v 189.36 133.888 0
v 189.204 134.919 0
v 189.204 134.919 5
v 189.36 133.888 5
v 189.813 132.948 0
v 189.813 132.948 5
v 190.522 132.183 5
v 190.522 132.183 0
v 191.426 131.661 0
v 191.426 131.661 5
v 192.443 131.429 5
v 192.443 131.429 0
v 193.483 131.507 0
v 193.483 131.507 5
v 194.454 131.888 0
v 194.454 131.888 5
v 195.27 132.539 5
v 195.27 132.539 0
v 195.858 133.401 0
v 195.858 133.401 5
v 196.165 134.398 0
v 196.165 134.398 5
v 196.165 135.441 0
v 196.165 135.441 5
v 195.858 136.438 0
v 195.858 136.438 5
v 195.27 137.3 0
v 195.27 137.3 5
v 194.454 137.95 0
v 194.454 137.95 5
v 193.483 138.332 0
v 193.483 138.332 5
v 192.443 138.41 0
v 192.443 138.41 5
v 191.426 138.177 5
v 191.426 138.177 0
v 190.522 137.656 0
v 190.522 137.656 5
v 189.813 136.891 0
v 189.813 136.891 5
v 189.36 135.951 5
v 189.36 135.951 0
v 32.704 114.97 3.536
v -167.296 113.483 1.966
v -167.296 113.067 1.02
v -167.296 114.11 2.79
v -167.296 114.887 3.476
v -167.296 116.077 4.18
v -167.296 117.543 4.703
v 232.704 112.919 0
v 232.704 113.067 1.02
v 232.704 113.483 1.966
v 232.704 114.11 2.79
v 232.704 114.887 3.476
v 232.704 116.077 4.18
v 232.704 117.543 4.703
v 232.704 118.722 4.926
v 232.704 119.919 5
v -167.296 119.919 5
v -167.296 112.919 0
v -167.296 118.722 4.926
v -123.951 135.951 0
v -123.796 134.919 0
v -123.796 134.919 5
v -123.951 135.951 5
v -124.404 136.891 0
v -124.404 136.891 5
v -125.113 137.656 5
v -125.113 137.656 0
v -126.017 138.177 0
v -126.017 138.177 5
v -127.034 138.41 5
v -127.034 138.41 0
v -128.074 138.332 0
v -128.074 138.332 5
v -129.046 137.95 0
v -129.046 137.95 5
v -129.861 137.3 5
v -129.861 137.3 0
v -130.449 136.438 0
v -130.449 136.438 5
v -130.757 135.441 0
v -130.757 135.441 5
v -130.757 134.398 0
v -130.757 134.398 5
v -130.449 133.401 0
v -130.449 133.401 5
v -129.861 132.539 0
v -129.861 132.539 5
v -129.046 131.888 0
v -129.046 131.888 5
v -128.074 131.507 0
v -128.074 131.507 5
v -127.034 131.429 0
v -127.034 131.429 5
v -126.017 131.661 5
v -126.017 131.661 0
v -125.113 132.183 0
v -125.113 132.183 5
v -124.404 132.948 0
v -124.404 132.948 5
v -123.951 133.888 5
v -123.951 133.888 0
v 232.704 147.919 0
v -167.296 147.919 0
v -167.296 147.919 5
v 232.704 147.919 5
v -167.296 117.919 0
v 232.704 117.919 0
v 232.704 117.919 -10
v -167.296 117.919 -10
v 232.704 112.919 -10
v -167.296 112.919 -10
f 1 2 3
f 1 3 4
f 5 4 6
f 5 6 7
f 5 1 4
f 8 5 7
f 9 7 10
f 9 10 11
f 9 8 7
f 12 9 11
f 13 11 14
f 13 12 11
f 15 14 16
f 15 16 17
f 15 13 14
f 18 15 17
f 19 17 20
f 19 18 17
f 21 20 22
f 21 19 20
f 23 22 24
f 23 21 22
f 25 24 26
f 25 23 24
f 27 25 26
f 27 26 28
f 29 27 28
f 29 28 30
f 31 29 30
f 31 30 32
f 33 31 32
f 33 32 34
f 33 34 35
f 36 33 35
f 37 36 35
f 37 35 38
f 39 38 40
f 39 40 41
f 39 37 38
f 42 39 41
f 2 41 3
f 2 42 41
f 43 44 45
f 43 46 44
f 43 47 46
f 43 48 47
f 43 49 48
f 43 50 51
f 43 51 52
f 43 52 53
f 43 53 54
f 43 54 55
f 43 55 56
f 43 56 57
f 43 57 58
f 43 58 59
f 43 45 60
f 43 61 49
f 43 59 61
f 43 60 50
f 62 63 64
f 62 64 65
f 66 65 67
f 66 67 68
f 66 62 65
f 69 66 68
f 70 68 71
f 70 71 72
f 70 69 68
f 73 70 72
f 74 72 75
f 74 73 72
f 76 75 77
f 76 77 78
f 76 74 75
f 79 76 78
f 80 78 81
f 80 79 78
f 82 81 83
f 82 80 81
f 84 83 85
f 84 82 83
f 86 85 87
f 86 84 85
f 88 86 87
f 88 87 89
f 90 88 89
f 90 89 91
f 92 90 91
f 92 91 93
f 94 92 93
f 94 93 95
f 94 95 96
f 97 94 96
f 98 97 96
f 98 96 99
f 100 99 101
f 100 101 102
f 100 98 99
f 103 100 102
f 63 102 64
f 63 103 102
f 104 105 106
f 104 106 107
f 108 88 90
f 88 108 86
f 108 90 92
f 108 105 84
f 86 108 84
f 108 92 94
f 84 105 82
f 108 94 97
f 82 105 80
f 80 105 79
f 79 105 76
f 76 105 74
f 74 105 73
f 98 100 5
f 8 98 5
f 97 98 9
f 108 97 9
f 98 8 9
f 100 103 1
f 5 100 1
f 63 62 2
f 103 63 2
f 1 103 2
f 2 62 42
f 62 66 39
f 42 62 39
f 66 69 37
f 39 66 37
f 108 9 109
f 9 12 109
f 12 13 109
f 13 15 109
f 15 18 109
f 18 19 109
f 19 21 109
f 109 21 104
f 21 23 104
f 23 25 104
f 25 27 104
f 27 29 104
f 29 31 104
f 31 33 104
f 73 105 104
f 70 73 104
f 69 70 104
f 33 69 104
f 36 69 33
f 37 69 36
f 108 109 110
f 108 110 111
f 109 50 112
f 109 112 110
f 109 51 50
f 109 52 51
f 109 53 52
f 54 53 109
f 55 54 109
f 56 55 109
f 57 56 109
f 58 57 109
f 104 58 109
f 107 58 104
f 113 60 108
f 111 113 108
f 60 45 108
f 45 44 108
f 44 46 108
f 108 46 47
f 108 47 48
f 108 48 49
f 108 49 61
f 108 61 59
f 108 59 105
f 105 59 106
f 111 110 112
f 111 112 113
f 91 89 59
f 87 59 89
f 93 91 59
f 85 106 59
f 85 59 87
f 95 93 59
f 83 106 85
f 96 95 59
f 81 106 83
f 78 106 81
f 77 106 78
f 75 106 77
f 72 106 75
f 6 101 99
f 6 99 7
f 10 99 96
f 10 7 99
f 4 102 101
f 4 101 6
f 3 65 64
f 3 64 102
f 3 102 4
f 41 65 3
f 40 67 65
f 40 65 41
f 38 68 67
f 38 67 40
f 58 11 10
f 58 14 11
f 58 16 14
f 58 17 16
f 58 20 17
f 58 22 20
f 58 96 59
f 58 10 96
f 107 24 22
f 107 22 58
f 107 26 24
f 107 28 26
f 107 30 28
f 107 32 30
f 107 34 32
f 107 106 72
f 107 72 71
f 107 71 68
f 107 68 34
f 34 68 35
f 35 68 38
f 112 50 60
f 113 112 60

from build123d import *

# Parameters (mm, degrees)
SKETCH_1_W      = 400
SKETCH_1_H      = 35
SKETCH_1_R      = 3.5
EXTRUDE_1_DEPTH = 5
SKETCH_2_W      = 400
SKETCH_2_H      = 5
EXTRUDE_2_DEPTH = 10
FILLET_1_SIZE   = 7
FILLET_1_SIZE_2 = 5


with BuildPart() as part:
    # 草图1 → 凸台-拉伸1 (new body)
    with BuildSketch(Plane.XY):
        with Locations((32.704402516, 130.419346185)):
            Rectangle(SKETCH_1_W, SKETCH_1_H)
        with Locations((-127.295597484, 134.919346185)):
            Circle(SKETCH_1_R, mode=Mode.SUBTRACT)
        with Locations(Location((192.704402516, 134.919346185, 0), (0, 0, 180))):
            Circle(SKETCH_1_R, mode=Mode.SUBTRACT)
    extrude(amount=EXTRUDE_1_DEPTH)

    # 草图2 → 凸台-拉伸2 (add)
    with BuildSketch(Plane(origin=(0, 0, 0), x_dir=(-1, 0, 0), z_dir=(0, 0, -1))):
        with Locations((-32.704402516, 115.419346185)):
            Rectangle(SKETCH_2_W, SKETCH_2_H)
    extrude(amount=EXTRUDE_2_DEPTH)

    # 圆角1
    # an asymmetric fillet: 7, 5 mm, written as the material it takes off along each edge
    with BuildSketch(Plane(origin=(250.204402516, 112.919346185, 5), x_dir=(0, 1, 0), z_dir=(-1, 0, 0))) as fillet_1_piece_1:
        with BuildLine():
            Bezier((FILLET_1_SIZE, 0), (0, 0), (0, FILLET_1_SIZE_2), weights=[1, 0.707106781, 1])
            Line((0, FILLET_1_SIZE_2), (0, 0))
            Line((0, 0), (FILLET_1_SIZE, 0))
        make_face()
    extrude(amount=435, mode=Mode.SUBTRACT)


solid = part.part
